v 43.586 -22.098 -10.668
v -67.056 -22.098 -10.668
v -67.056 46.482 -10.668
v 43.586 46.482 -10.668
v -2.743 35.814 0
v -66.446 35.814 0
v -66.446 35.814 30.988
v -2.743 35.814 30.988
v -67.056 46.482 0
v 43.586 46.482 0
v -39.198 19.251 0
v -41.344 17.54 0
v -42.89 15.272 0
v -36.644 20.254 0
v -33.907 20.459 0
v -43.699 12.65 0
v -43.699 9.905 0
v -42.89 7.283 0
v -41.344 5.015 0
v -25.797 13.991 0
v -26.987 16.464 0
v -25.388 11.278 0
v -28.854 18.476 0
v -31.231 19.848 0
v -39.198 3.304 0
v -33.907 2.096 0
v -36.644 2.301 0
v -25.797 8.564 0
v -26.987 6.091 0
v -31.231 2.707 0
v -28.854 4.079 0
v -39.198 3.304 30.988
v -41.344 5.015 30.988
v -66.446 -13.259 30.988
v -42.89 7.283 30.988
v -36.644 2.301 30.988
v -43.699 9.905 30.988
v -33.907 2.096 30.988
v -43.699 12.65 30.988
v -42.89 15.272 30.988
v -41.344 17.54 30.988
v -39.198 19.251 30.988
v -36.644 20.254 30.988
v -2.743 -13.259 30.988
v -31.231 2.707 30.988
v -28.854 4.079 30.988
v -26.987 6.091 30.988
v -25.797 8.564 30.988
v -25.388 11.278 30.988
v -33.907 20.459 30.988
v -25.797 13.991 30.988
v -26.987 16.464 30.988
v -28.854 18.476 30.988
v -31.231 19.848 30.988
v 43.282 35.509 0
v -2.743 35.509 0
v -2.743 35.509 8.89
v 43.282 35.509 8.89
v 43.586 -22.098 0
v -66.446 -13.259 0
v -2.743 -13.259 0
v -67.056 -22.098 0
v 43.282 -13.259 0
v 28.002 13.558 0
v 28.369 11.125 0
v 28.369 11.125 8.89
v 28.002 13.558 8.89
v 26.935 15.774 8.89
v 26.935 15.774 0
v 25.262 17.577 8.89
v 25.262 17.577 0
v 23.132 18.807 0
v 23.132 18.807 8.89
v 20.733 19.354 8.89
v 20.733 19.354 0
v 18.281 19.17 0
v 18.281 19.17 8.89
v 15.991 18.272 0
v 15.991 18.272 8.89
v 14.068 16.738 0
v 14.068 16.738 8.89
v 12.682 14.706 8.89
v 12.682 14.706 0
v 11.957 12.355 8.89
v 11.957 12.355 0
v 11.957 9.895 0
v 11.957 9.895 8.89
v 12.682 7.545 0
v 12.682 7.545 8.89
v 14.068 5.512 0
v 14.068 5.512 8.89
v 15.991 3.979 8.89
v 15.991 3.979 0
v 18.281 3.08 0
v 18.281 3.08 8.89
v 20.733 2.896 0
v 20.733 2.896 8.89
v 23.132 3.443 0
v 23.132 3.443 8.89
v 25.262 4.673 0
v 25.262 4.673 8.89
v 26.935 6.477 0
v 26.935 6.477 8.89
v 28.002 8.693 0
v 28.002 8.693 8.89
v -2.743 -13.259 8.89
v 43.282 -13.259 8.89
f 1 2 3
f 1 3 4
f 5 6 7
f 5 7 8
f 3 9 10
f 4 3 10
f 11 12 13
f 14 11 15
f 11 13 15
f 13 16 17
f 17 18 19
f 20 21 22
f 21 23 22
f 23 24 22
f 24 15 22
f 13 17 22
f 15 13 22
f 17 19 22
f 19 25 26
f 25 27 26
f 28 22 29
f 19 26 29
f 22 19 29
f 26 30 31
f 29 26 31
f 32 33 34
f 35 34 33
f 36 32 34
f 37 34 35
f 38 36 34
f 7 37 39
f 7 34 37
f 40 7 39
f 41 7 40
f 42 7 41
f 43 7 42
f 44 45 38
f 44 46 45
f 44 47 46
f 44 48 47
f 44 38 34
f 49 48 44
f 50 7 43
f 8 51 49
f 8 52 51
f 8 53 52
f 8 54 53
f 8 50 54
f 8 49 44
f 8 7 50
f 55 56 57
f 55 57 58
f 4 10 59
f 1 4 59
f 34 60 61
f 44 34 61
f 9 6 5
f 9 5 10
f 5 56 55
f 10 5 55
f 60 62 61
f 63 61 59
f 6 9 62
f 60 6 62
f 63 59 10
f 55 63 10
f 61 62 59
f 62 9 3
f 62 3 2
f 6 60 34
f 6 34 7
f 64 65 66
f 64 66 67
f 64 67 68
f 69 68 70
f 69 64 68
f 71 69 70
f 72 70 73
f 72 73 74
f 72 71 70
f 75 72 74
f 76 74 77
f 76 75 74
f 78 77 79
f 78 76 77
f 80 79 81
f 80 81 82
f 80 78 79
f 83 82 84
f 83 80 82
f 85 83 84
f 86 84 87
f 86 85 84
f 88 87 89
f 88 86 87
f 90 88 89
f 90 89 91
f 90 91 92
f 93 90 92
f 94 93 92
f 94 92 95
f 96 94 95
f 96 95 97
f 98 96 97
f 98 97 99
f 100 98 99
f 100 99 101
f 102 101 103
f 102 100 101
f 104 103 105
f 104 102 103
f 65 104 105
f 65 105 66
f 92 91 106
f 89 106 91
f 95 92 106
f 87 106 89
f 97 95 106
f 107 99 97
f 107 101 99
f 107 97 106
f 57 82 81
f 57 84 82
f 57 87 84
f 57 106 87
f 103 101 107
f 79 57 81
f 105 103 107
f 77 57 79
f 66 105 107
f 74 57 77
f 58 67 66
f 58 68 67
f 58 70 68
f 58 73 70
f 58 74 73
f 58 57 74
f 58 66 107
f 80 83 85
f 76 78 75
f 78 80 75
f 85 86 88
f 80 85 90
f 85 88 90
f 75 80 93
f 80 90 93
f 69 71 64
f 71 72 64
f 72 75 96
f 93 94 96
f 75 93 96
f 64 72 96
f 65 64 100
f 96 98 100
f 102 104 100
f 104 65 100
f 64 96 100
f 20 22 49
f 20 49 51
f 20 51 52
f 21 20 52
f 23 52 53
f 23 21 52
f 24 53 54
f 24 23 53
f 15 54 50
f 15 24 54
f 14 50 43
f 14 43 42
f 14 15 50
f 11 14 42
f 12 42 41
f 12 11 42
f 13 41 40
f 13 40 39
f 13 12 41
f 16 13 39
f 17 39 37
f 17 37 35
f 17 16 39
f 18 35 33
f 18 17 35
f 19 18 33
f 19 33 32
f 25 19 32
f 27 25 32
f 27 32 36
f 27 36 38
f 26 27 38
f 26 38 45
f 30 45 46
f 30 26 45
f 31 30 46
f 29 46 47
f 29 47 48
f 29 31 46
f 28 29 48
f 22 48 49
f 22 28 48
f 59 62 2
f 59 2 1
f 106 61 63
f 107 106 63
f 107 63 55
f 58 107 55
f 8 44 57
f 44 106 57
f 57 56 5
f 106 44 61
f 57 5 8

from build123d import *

# Parameters (mm, degrees)
F0_W     = 63.703202
F0_H     = 49.072805
F0_R     = 9.207281
F1_DEPTH = 30.988
F2_W     = 46.3296
F2_H     = 48.767999
F2_R     = 8.252146
F3_DEPTH = 8.89
F4_W     = 110.642403
F4_H     = 68.580005
F5_DEPTH = 10.668


with BuildPart() as f1:
    # F0 (on Top) → F1 (new body)
    with BuildSketch(Plane.XY):
        with Locations((-34.594801, 11.277599)):
            Rectangle(F0_W, F0_H)
        with Locations((-34.594801, 11.2776)):
            Circle(F0_R, mode=Mode.SUBTRACT)
    extrude(amount=F1_DEPTH)

    # F2 (on Top) → F3 (join)
    with BuildSketch(Plane.XY):
        with Locations((20.1168, 11.125199)):
            Rectangle(F2_W, F2_H)
        with Locations((20.1168, 11.125199)):
            Circle(F2_R, mode=Mode.SUBTRACT)
    extrude(amount=F3_DEPTH)

    # F4 (on face) → F5 (join)
    with BuildSketch(Plane(origin=(0, 0, 0), x_dir=(1, 0, 0), z_dir=(0, 0, -1))):
        with Locations((-11.734799, -12.192001)):
            Rectangle(F4_W, F4_H)
    extrude(amount=F5_DEPTH)


solid = f1.part
